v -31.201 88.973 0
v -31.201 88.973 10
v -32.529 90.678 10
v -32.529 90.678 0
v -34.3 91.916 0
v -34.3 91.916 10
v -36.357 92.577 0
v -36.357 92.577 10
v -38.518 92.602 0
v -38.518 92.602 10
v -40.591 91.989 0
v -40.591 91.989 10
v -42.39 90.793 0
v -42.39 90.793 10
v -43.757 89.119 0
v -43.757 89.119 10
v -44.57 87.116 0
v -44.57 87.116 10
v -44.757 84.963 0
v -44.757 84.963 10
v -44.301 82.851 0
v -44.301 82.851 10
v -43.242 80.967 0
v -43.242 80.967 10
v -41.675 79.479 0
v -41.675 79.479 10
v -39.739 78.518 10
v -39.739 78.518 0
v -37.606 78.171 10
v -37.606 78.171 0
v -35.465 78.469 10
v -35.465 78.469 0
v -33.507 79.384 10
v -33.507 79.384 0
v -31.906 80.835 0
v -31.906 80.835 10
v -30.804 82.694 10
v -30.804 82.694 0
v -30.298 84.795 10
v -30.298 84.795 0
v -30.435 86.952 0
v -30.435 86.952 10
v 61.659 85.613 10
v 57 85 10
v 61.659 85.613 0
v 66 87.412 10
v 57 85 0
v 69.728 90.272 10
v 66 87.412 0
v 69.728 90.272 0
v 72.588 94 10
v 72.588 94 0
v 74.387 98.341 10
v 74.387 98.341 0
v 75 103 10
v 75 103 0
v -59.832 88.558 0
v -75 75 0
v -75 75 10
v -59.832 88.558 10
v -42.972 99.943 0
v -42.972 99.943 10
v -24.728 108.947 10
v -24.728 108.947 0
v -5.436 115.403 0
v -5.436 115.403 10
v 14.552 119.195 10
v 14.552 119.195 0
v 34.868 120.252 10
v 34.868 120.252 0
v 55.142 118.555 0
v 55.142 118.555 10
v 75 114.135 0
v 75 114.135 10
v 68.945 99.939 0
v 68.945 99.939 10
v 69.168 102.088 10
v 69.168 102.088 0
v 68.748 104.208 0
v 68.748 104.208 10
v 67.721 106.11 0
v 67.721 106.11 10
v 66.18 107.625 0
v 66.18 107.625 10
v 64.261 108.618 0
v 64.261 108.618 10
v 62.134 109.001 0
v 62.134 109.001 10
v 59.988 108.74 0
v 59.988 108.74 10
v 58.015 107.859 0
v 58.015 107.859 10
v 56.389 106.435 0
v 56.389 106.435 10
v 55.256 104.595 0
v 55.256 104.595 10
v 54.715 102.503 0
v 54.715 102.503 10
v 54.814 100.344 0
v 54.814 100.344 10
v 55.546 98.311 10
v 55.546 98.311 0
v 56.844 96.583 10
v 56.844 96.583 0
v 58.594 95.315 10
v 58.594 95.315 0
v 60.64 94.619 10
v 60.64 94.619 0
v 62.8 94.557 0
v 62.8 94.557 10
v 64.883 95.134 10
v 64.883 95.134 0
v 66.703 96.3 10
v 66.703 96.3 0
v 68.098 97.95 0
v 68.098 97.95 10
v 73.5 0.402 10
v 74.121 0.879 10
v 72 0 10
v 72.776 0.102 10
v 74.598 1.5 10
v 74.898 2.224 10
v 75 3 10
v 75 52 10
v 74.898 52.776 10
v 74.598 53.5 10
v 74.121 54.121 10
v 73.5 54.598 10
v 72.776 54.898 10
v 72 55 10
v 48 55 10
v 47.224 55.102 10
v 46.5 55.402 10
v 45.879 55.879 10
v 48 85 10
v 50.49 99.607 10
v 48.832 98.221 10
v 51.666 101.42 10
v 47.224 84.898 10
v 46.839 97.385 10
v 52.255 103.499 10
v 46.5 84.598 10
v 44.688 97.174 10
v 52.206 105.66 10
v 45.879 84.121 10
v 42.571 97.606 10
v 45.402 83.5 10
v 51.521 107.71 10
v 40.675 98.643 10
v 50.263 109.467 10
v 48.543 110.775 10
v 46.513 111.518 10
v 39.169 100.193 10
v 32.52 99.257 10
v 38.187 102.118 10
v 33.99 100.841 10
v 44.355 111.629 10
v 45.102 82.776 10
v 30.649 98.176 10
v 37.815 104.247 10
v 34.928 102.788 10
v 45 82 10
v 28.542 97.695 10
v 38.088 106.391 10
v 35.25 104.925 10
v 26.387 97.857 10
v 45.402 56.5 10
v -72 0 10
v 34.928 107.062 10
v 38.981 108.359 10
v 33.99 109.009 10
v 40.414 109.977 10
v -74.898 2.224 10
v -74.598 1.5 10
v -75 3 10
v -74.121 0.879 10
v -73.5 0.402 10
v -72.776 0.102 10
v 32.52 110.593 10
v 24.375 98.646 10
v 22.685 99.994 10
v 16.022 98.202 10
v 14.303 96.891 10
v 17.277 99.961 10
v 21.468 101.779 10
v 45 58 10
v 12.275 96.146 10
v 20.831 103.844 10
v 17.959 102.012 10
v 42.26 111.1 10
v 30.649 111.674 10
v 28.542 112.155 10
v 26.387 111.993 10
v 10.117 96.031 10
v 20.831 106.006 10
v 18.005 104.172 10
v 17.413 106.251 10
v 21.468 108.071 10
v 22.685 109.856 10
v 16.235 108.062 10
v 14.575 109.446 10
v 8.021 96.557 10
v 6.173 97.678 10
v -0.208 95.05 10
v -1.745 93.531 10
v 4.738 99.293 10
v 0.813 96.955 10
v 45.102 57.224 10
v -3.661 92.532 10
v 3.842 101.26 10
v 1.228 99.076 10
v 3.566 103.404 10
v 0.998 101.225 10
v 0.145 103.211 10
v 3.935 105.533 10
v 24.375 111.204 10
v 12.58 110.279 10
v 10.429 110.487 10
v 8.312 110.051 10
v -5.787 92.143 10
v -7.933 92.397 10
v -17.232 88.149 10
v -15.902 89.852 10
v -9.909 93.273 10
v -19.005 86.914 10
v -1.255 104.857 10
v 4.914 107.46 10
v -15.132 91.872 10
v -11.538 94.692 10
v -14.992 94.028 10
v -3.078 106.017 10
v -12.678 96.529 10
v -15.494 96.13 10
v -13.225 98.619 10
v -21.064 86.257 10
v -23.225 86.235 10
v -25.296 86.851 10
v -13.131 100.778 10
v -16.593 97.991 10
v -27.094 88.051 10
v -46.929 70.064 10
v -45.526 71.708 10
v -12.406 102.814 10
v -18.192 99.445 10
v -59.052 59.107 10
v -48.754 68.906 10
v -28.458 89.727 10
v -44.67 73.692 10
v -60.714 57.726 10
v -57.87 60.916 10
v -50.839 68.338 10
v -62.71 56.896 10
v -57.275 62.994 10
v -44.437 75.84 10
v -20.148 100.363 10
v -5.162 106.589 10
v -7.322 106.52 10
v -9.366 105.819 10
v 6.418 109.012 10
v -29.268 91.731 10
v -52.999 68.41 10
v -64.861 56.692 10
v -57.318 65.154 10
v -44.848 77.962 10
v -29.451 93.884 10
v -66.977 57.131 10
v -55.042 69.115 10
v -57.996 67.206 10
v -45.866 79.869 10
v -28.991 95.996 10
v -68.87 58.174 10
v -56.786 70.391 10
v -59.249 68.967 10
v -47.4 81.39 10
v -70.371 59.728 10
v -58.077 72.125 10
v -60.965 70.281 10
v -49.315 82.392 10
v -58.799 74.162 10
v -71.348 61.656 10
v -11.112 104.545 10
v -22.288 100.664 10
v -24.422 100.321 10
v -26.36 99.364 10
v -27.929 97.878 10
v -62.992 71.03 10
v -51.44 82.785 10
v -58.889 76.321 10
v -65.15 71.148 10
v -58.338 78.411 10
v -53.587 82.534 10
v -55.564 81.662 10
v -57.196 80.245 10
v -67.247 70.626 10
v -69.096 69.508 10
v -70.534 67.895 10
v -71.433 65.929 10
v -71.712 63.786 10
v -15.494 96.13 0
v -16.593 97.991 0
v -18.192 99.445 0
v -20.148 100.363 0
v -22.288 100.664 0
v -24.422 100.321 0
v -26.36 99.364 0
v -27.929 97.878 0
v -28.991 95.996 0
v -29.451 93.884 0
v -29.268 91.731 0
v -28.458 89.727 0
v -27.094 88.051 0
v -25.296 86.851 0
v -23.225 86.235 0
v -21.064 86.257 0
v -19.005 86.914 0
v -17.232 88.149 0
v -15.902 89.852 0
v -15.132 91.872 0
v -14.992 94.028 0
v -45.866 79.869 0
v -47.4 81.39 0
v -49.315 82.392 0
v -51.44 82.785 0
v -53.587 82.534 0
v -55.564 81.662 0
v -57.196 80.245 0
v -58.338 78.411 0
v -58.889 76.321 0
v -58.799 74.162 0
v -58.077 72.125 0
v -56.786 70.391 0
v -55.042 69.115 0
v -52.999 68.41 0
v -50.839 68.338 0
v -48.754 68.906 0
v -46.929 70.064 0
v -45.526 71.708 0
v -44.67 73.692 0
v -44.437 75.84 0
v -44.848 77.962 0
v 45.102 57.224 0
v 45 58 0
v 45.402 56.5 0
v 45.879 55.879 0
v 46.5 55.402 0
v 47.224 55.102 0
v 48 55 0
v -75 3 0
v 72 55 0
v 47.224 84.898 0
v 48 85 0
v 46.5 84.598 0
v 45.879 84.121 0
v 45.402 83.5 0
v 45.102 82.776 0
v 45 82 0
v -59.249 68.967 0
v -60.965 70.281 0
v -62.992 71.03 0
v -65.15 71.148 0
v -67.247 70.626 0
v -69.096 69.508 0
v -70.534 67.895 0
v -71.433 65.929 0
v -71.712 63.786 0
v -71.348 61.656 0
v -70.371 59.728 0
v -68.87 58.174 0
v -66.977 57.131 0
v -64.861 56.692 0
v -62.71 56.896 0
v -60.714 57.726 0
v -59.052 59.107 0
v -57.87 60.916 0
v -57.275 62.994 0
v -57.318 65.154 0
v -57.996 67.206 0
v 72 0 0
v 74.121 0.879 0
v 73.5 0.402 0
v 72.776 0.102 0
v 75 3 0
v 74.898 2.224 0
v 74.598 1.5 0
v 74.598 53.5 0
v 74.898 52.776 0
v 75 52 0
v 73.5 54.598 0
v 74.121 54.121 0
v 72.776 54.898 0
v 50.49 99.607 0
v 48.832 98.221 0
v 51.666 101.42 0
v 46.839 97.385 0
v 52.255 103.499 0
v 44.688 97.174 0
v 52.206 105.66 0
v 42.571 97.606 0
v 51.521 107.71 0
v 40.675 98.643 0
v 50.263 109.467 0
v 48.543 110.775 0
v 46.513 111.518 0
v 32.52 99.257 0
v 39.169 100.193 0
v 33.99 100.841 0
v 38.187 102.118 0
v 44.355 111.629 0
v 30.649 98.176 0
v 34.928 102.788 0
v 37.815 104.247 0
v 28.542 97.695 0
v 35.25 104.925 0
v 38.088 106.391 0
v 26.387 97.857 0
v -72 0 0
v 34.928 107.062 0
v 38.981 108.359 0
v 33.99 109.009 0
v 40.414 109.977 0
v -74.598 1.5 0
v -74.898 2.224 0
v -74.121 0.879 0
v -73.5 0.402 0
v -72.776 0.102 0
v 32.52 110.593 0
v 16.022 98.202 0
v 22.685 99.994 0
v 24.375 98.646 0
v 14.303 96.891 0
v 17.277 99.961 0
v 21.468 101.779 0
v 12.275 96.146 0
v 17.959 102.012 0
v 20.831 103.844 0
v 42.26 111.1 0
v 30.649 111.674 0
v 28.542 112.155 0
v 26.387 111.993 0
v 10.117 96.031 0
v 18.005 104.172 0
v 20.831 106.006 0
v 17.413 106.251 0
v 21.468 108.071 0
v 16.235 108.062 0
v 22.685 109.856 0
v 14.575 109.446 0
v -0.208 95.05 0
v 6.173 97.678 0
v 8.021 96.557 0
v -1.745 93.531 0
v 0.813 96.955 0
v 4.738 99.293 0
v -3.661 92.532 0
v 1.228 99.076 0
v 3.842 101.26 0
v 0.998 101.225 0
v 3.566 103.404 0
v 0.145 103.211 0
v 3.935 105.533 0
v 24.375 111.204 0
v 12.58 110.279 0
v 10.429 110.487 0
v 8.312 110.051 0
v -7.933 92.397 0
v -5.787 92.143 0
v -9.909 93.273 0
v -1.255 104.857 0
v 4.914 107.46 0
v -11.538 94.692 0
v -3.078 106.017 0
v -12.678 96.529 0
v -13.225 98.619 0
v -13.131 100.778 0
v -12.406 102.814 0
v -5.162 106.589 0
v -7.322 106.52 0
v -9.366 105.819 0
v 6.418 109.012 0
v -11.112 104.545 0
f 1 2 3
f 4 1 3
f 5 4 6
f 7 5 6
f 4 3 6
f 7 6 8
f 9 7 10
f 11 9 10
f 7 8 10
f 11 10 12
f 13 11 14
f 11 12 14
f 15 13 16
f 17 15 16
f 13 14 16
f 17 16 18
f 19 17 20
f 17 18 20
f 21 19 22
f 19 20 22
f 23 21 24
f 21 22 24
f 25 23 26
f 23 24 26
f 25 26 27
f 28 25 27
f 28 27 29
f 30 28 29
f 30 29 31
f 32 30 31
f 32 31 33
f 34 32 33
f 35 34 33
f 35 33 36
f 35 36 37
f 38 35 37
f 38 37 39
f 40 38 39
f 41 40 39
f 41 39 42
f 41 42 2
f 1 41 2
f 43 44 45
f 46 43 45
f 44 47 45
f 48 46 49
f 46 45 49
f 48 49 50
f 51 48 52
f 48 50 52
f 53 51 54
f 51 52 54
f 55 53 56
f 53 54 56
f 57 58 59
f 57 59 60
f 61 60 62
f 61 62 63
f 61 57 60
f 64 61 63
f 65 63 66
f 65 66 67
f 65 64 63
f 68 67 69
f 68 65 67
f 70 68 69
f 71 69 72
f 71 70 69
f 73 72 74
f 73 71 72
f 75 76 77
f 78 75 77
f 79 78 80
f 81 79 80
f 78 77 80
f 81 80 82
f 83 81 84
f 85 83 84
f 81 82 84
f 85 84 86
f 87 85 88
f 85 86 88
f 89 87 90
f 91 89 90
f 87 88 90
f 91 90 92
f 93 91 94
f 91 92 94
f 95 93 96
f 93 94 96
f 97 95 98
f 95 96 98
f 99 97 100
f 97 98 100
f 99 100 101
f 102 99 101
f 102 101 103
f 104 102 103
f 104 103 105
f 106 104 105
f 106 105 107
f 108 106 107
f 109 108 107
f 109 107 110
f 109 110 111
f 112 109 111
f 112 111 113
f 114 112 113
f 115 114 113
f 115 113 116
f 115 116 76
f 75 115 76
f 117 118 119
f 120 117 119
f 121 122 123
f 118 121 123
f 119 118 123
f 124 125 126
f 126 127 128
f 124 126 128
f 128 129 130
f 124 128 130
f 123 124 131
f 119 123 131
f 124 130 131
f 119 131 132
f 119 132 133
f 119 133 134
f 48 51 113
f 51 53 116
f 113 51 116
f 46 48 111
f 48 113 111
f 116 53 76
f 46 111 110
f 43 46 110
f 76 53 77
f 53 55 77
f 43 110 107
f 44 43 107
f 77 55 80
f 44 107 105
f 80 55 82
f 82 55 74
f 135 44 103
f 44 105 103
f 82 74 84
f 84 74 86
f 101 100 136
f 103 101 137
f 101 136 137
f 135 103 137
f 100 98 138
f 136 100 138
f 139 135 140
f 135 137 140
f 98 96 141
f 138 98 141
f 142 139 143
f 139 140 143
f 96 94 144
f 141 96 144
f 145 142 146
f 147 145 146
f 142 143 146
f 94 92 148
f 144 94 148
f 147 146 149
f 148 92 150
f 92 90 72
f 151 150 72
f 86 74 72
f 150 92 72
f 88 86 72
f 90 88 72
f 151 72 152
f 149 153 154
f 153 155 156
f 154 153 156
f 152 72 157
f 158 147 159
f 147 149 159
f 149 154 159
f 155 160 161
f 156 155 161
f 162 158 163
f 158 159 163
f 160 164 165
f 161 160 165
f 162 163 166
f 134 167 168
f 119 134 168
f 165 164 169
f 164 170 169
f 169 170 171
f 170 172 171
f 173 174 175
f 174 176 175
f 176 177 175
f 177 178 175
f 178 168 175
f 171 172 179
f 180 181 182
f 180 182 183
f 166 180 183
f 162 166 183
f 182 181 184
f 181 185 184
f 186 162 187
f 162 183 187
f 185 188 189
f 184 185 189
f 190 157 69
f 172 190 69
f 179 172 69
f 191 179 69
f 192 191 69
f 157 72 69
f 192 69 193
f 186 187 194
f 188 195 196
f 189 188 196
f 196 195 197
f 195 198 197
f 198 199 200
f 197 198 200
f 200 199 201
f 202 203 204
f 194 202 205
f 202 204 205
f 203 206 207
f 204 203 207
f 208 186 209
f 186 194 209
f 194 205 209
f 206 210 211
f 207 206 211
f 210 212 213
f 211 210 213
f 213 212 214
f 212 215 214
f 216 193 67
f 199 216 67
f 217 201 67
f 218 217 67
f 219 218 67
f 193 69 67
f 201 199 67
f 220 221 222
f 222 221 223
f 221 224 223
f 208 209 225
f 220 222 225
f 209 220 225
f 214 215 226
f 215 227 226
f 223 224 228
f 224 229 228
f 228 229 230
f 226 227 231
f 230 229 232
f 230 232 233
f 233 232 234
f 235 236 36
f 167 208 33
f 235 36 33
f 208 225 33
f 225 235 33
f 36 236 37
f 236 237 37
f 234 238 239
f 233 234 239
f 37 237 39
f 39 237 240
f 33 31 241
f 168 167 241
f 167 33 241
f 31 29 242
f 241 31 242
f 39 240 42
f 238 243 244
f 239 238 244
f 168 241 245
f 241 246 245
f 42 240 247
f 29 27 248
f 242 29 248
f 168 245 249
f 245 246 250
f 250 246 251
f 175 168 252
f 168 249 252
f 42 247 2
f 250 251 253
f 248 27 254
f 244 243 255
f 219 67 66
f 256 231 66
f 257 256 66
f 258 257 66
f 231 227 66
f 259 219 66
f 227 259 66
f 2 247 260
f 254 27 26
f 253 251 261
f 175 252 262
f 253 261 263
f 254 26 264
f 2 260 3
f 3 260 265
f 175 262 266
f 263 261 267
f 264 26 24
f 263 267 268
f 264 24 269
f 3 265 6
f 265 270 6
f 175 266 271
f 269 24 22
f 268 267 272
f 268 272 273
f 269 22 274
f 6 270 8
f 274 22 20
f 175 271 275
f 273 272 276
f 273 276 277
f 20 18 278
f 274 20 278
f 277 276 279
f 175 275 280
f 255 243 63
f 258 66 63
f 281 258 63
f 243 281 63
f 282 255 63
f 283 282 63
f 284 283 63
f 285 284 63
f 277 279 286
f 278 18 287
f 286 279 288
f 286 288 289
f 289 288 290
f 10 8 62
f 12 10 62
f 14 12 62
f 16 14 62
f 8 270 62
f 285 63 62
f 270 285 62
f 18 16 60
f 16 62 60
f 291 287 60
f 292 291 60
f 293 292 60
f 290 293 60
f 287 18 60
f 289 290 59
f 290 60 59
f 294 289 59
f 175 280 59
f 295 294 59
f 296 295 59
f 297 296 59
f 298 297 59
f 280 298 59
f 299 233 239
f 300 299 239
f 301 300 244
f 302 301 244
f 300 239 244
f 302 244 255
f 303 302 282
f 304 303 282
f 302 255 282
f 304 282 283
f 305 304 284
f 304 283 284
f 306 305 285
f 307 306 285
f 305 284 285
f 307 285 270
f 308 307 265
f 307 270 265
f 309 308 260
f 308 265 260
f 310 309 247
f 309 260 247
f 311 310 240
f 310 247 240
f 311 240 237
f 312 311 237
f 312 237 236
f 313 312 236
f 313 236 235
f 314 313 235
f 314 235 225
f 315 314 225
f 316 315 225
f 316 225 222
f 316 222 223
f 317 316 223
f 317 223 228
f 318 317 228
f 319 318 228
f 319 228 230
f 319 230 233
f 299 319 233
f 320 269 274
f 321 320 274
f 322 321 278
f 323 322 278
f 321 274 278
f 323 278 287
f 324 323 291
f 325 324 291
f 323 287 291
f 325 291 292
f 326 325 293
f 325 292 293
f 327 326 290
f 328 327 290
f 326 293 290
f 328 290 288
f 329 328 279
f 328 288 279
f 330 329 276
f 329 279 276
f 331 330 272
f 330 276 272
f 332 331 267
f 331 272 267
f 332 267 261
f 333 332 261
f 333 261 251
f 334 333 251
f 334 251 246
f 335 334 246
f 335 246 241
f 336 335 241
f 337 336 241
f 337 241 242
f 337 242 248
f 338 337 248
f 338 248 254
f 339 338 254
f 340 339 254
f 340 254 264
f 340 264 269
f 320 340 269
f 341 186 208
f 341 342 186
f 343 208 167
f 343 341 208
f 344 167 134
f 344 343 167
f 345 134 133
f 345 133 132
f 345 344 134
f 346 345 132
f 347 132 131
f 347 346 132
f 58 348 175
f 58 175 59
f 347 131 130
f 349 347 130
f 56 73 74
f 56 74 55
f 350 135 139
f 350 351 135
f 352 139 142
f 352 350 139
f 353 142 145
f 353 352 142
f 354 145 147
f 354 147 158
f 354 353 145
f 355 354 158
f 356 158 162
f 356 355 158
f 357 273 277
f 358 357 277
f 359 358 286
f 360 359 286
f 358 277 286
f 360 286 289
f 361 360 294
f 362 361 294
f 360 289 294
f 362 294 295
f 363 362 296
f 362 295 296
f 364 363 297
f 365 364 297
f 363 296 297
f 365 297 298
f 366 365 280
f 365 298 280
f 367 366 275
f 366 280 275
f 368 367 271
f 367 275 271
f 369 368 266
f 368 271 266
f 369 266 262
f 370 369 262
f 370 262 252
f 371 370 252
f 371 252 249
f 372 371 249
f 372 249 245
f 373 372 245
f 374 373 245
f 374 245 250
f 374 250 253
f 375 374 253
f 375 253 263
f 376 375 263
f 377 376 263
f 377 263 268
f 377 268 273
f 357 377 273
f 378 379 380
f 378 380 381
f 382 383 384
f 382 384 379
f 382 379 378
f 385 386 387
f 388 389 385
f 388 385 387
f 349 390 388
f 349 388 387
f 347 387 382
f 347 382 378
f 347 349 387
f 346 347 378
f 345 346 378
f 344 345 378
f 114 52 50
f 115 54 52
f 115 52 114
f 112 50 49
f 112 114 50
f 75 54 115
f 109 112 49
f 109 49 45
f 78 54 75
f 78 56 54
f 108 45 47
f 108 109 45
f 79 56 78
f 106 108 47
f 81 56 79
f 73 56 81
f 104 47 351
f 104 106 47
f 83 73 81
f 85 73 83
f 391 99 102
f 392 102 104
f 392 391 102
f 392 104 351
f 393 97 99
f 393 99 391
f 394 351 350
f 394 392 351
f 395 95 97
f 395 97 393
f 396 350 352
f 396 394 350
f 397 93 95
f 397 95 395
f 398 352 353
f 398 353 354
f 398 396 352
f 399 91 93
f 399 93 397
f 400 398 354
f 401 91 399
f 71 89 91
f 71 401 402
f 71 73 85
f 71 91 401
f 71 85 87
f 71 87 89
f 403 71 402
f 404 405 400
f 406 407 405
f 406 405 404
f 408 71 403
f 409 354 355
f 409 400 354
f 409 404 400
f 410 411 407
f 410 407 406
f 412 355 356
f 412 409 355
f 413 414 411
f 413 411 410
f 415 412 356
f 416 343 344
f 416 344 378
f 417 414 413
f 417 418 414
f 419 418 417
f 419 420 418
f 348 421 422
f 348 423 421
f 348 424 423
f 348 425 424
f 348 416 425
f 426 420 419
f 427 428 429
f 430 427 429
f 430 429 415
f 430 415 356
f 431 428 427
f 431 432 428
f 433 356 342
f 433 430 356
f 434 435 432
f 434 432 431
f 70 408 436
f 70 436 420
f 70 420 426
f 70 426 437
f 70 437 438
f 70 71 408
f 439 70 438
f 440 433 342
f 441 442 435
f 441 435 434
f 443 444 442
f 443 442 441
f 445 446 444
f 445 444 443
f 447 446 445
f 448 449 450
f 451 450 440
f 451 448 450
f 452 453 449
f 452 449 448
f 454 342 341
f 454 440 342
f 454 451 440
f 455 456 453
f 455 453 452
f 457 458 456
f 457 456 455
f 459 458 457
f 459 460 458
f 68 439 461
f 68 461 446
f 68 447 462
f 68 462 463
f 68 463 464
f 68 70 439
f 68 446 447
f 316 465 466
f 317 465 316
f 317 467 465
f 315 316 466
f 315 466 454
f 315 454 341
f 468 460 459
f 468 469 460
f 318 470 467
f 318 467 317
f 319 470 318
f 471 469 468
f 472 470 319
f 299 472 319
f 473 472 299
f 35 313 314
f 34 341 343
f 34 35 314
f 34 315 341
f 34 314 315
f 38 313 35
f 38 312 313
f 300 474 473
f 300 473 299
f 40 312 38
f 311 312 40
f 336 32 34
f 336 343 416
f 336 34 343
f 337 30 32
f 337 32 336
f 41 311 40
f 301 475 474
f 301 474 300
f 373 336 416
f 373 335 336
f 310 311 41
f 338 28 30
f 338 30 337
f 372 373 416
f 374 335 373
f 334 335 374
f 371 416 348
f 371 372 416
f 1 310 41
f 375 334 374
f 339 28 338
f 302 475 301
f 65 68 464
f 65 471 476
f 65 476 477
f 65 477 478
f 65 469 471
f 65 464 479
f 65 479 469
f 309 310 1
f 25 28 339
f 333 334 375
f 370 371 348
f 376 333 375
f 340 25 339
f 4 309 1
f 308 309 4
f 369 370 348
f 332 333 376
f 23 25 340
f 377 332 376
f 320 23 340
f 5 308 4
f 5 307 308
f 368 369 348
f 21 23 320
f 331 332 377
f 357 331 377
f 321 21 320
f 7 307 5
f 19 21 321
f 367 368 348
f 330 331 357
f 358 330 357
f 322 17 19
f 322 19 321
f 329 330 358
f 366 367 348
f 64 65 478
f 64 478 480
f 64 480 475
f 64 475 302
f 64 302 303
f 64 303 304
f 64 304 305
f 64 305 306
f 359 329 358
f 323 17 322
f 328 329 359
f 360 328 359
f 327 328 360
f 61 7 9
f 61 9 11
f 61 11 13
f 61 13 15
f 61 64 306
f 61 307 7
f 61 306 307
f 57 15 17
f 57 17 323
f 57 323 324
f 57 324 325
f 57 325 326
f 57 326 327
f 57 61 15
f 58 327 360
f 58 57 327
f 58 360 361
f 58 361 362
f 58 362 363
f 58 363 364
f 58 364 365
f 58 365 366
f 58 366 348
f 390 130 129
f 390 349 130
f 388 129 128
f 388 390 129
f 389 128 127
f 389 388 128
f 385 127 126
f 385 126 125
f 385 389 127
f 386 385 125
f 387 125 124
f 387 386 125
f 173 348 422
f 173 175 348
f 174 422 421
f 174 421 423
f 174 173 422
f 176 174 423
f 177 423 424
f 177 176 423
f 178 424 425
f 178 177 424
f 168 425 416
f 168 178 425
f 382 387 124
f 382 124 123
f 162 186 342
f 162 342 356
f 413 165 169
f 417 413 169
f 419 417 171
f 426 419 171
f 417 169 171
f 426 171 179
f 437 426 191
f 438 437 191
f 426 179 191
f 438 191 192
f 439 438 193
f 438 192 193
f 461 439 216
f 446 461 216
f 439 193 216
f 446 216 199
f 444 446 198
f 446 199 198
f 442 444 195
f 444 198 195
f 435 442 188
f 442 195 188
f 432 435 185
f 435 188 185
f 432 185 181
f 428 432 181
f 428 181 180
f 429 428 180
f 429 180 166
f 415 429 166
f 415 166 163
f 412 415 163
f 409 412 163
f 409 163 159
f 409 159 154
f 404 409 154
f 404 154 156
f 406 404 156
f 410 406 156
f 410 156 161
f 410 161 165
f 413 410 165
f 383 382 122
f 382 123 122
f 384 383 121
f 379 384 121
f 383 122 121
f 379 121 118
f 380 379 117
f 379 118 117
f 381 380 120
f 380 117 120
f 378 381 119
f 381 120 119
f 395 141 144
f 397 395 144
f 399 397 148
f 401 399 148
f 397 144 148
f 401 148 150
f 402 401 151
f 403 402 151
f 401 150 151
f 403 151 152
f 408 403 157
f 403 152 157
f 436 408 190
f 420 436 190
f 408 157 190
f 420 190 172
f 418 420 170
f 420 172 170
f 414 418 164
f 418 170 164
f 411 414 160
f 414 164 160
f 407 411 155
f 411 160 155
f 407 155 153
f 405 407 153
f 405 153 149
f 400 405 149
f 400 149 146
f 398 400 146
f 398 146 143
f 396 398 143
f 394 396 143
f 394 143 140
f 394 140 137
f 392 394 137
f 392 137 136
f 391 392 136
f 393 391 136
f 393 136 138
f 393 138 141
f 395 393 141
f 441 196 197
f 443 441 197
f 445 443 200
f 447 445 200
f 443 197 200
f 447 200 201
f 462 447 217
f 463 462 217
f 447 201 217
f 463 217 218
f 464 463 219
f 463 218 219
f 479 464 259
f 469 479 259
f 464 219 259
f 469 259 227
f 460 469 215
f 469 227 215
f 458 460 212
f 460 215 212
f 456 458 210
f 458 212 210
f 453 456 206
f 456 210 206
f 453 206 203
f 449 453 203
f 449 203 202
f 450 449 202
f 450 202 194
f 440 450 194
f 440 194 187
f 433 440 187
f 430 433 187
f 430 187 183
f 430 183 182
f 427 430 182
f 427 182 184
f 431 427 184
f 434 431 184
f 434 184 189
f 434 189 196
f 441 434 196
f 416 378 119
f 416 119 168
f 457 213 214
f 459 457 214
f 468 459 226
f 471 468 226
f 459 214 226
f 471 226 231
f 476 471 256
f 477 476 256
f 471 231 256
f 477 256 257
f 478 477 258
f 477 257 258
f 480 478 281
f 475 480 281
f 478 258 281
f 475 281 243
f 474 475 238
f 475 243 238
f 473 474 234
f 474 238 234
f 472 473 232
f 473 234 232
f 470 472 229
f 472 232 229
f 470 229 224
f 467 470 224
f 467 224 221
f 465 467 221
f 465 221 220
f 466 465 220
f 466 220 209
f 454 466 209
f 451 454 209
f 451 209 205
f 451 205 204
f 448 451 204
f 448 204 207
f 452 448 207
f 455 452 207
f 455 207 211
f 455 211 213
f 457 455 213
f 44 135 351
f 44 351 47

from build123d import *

# Parameters (mm, degrees)
BOSS_EXTRU_1_DEPTH           = 10
ESQUISSE2_R                  = 7.25
ENL_V_MAT_EXTRU_1_DEPTH      = 11
R_P_TITION_CIRCULAIRE1_COUNT = 7
R_P_TITION_CIRCULAIRE1_ANGLE = 44
R_P_TITION_CIRCULAIRE2_COUNT = 3
R_P_TITION_CIRCULAIRE2_ANGLE = 14.5
ESQUISSE5_W                  = 30
ESQUISSE5_H                  = 30
ENL_V_MAT_EXTRU_2_DEPTH      = 10
CONG_1_R                     = 18
CONG_2_R                     = 3


with BuildPart() as part:
    # Esquisse1 → Boss.-Extru.1 (new body)
    with BuildSketch(Plane.XY):
        with BuildLine():
            Line((75, 0), (-75, 0))
            Line((-75, 0), (-75, 75))
            ThreePointArc((-75, 75), (-5.436050989, 115.40325318), (75, 114.135353054))
            Line((75, 114.135353054), (75, 0))
        make_face()
    extrude(amount=BOSS_EXTRU_1_DEPTH)

    # Esquisse2 → Enlèv. mat.-Extru.1 (cut, through all)
    with BuildSketch(Plane.XY.offset(10)):
        with Locations((28, 104.924979155)):
            Circle(ESQUISSE2_R)
    enl_v_mat_extru_1 = extrude(amount=-ENL_V_MAT_EXTRU_1_DEPTH, mode=Mode.SUBTRACT)

    # Répétition circulaire1: Enlèv. mat.-Extru.1 ×7 about axis
    r_p_tition_circulaire1_axis = Axis((32.5, -30, 0), (0, 0, 1))
    for i in range(1, R_P_TITION_CIRCULAIRE1_COUNT):
        add(enl_v_mat_extru_1.rotate(r_p_tition_circulaire1_axis, i * R_P_TITION_CIRCULAIRE1_ANGLE / (R_P_TITION_CIRCULAIRE1_COUNT - 1)), mode=Mode.SUBTRACT)

    # Répétition circulaire2: Enlèv. mat.-Extru.1 ×3 about axis
    r_p_tition_circulaire2_axis = Axis((32.5, -30, 0), (0, 0, -1))
    for i in range(1, R_P_TITION_CIRCULAIRE2_COUNT):
        add(enl_v_mat_extru_1.rotate(r_p_tition_circulaire2_axis, i * R_P_TITION_CIRCULAIRE2_ANGLE / (R_P_TITION_CIRCULAIRE2_COUNT - 1)), mode=Mode.SUBTRACT)

    # Esquisse5 → Enlèv. mat.-Extru.2 (cut)
    with BuildSketch(Plane.XY.offset(10)):
        with Locations((60, 70)):
            Rectangle(ESQUISSE5_W, ESQUISSE5_H)
    extrude(amount=-ENL_V_MAT_EXTRU_2_DEPTH, mode=Mode.SUBTRACT)

    # Congé1
    cong_1_edges = [part.edges().sort_by_distance(p)[0] for p in [
        (75, 85, 5),
    ]]
    fillet(cong_1_edges, radius=CONG_1_R)

    # Congé2
    cong_2_edges = [part.edges().sort_by_distance(p)[0] for p in [
        (75, 55, 5),
        (45, 55, 5),
        (45, 85, 5),
        (75, 0, 5),
        (-75, 0, 5),
    ]]
    fillet(cong_2_edges, radius=CONG_2_R)


solid = part.part
